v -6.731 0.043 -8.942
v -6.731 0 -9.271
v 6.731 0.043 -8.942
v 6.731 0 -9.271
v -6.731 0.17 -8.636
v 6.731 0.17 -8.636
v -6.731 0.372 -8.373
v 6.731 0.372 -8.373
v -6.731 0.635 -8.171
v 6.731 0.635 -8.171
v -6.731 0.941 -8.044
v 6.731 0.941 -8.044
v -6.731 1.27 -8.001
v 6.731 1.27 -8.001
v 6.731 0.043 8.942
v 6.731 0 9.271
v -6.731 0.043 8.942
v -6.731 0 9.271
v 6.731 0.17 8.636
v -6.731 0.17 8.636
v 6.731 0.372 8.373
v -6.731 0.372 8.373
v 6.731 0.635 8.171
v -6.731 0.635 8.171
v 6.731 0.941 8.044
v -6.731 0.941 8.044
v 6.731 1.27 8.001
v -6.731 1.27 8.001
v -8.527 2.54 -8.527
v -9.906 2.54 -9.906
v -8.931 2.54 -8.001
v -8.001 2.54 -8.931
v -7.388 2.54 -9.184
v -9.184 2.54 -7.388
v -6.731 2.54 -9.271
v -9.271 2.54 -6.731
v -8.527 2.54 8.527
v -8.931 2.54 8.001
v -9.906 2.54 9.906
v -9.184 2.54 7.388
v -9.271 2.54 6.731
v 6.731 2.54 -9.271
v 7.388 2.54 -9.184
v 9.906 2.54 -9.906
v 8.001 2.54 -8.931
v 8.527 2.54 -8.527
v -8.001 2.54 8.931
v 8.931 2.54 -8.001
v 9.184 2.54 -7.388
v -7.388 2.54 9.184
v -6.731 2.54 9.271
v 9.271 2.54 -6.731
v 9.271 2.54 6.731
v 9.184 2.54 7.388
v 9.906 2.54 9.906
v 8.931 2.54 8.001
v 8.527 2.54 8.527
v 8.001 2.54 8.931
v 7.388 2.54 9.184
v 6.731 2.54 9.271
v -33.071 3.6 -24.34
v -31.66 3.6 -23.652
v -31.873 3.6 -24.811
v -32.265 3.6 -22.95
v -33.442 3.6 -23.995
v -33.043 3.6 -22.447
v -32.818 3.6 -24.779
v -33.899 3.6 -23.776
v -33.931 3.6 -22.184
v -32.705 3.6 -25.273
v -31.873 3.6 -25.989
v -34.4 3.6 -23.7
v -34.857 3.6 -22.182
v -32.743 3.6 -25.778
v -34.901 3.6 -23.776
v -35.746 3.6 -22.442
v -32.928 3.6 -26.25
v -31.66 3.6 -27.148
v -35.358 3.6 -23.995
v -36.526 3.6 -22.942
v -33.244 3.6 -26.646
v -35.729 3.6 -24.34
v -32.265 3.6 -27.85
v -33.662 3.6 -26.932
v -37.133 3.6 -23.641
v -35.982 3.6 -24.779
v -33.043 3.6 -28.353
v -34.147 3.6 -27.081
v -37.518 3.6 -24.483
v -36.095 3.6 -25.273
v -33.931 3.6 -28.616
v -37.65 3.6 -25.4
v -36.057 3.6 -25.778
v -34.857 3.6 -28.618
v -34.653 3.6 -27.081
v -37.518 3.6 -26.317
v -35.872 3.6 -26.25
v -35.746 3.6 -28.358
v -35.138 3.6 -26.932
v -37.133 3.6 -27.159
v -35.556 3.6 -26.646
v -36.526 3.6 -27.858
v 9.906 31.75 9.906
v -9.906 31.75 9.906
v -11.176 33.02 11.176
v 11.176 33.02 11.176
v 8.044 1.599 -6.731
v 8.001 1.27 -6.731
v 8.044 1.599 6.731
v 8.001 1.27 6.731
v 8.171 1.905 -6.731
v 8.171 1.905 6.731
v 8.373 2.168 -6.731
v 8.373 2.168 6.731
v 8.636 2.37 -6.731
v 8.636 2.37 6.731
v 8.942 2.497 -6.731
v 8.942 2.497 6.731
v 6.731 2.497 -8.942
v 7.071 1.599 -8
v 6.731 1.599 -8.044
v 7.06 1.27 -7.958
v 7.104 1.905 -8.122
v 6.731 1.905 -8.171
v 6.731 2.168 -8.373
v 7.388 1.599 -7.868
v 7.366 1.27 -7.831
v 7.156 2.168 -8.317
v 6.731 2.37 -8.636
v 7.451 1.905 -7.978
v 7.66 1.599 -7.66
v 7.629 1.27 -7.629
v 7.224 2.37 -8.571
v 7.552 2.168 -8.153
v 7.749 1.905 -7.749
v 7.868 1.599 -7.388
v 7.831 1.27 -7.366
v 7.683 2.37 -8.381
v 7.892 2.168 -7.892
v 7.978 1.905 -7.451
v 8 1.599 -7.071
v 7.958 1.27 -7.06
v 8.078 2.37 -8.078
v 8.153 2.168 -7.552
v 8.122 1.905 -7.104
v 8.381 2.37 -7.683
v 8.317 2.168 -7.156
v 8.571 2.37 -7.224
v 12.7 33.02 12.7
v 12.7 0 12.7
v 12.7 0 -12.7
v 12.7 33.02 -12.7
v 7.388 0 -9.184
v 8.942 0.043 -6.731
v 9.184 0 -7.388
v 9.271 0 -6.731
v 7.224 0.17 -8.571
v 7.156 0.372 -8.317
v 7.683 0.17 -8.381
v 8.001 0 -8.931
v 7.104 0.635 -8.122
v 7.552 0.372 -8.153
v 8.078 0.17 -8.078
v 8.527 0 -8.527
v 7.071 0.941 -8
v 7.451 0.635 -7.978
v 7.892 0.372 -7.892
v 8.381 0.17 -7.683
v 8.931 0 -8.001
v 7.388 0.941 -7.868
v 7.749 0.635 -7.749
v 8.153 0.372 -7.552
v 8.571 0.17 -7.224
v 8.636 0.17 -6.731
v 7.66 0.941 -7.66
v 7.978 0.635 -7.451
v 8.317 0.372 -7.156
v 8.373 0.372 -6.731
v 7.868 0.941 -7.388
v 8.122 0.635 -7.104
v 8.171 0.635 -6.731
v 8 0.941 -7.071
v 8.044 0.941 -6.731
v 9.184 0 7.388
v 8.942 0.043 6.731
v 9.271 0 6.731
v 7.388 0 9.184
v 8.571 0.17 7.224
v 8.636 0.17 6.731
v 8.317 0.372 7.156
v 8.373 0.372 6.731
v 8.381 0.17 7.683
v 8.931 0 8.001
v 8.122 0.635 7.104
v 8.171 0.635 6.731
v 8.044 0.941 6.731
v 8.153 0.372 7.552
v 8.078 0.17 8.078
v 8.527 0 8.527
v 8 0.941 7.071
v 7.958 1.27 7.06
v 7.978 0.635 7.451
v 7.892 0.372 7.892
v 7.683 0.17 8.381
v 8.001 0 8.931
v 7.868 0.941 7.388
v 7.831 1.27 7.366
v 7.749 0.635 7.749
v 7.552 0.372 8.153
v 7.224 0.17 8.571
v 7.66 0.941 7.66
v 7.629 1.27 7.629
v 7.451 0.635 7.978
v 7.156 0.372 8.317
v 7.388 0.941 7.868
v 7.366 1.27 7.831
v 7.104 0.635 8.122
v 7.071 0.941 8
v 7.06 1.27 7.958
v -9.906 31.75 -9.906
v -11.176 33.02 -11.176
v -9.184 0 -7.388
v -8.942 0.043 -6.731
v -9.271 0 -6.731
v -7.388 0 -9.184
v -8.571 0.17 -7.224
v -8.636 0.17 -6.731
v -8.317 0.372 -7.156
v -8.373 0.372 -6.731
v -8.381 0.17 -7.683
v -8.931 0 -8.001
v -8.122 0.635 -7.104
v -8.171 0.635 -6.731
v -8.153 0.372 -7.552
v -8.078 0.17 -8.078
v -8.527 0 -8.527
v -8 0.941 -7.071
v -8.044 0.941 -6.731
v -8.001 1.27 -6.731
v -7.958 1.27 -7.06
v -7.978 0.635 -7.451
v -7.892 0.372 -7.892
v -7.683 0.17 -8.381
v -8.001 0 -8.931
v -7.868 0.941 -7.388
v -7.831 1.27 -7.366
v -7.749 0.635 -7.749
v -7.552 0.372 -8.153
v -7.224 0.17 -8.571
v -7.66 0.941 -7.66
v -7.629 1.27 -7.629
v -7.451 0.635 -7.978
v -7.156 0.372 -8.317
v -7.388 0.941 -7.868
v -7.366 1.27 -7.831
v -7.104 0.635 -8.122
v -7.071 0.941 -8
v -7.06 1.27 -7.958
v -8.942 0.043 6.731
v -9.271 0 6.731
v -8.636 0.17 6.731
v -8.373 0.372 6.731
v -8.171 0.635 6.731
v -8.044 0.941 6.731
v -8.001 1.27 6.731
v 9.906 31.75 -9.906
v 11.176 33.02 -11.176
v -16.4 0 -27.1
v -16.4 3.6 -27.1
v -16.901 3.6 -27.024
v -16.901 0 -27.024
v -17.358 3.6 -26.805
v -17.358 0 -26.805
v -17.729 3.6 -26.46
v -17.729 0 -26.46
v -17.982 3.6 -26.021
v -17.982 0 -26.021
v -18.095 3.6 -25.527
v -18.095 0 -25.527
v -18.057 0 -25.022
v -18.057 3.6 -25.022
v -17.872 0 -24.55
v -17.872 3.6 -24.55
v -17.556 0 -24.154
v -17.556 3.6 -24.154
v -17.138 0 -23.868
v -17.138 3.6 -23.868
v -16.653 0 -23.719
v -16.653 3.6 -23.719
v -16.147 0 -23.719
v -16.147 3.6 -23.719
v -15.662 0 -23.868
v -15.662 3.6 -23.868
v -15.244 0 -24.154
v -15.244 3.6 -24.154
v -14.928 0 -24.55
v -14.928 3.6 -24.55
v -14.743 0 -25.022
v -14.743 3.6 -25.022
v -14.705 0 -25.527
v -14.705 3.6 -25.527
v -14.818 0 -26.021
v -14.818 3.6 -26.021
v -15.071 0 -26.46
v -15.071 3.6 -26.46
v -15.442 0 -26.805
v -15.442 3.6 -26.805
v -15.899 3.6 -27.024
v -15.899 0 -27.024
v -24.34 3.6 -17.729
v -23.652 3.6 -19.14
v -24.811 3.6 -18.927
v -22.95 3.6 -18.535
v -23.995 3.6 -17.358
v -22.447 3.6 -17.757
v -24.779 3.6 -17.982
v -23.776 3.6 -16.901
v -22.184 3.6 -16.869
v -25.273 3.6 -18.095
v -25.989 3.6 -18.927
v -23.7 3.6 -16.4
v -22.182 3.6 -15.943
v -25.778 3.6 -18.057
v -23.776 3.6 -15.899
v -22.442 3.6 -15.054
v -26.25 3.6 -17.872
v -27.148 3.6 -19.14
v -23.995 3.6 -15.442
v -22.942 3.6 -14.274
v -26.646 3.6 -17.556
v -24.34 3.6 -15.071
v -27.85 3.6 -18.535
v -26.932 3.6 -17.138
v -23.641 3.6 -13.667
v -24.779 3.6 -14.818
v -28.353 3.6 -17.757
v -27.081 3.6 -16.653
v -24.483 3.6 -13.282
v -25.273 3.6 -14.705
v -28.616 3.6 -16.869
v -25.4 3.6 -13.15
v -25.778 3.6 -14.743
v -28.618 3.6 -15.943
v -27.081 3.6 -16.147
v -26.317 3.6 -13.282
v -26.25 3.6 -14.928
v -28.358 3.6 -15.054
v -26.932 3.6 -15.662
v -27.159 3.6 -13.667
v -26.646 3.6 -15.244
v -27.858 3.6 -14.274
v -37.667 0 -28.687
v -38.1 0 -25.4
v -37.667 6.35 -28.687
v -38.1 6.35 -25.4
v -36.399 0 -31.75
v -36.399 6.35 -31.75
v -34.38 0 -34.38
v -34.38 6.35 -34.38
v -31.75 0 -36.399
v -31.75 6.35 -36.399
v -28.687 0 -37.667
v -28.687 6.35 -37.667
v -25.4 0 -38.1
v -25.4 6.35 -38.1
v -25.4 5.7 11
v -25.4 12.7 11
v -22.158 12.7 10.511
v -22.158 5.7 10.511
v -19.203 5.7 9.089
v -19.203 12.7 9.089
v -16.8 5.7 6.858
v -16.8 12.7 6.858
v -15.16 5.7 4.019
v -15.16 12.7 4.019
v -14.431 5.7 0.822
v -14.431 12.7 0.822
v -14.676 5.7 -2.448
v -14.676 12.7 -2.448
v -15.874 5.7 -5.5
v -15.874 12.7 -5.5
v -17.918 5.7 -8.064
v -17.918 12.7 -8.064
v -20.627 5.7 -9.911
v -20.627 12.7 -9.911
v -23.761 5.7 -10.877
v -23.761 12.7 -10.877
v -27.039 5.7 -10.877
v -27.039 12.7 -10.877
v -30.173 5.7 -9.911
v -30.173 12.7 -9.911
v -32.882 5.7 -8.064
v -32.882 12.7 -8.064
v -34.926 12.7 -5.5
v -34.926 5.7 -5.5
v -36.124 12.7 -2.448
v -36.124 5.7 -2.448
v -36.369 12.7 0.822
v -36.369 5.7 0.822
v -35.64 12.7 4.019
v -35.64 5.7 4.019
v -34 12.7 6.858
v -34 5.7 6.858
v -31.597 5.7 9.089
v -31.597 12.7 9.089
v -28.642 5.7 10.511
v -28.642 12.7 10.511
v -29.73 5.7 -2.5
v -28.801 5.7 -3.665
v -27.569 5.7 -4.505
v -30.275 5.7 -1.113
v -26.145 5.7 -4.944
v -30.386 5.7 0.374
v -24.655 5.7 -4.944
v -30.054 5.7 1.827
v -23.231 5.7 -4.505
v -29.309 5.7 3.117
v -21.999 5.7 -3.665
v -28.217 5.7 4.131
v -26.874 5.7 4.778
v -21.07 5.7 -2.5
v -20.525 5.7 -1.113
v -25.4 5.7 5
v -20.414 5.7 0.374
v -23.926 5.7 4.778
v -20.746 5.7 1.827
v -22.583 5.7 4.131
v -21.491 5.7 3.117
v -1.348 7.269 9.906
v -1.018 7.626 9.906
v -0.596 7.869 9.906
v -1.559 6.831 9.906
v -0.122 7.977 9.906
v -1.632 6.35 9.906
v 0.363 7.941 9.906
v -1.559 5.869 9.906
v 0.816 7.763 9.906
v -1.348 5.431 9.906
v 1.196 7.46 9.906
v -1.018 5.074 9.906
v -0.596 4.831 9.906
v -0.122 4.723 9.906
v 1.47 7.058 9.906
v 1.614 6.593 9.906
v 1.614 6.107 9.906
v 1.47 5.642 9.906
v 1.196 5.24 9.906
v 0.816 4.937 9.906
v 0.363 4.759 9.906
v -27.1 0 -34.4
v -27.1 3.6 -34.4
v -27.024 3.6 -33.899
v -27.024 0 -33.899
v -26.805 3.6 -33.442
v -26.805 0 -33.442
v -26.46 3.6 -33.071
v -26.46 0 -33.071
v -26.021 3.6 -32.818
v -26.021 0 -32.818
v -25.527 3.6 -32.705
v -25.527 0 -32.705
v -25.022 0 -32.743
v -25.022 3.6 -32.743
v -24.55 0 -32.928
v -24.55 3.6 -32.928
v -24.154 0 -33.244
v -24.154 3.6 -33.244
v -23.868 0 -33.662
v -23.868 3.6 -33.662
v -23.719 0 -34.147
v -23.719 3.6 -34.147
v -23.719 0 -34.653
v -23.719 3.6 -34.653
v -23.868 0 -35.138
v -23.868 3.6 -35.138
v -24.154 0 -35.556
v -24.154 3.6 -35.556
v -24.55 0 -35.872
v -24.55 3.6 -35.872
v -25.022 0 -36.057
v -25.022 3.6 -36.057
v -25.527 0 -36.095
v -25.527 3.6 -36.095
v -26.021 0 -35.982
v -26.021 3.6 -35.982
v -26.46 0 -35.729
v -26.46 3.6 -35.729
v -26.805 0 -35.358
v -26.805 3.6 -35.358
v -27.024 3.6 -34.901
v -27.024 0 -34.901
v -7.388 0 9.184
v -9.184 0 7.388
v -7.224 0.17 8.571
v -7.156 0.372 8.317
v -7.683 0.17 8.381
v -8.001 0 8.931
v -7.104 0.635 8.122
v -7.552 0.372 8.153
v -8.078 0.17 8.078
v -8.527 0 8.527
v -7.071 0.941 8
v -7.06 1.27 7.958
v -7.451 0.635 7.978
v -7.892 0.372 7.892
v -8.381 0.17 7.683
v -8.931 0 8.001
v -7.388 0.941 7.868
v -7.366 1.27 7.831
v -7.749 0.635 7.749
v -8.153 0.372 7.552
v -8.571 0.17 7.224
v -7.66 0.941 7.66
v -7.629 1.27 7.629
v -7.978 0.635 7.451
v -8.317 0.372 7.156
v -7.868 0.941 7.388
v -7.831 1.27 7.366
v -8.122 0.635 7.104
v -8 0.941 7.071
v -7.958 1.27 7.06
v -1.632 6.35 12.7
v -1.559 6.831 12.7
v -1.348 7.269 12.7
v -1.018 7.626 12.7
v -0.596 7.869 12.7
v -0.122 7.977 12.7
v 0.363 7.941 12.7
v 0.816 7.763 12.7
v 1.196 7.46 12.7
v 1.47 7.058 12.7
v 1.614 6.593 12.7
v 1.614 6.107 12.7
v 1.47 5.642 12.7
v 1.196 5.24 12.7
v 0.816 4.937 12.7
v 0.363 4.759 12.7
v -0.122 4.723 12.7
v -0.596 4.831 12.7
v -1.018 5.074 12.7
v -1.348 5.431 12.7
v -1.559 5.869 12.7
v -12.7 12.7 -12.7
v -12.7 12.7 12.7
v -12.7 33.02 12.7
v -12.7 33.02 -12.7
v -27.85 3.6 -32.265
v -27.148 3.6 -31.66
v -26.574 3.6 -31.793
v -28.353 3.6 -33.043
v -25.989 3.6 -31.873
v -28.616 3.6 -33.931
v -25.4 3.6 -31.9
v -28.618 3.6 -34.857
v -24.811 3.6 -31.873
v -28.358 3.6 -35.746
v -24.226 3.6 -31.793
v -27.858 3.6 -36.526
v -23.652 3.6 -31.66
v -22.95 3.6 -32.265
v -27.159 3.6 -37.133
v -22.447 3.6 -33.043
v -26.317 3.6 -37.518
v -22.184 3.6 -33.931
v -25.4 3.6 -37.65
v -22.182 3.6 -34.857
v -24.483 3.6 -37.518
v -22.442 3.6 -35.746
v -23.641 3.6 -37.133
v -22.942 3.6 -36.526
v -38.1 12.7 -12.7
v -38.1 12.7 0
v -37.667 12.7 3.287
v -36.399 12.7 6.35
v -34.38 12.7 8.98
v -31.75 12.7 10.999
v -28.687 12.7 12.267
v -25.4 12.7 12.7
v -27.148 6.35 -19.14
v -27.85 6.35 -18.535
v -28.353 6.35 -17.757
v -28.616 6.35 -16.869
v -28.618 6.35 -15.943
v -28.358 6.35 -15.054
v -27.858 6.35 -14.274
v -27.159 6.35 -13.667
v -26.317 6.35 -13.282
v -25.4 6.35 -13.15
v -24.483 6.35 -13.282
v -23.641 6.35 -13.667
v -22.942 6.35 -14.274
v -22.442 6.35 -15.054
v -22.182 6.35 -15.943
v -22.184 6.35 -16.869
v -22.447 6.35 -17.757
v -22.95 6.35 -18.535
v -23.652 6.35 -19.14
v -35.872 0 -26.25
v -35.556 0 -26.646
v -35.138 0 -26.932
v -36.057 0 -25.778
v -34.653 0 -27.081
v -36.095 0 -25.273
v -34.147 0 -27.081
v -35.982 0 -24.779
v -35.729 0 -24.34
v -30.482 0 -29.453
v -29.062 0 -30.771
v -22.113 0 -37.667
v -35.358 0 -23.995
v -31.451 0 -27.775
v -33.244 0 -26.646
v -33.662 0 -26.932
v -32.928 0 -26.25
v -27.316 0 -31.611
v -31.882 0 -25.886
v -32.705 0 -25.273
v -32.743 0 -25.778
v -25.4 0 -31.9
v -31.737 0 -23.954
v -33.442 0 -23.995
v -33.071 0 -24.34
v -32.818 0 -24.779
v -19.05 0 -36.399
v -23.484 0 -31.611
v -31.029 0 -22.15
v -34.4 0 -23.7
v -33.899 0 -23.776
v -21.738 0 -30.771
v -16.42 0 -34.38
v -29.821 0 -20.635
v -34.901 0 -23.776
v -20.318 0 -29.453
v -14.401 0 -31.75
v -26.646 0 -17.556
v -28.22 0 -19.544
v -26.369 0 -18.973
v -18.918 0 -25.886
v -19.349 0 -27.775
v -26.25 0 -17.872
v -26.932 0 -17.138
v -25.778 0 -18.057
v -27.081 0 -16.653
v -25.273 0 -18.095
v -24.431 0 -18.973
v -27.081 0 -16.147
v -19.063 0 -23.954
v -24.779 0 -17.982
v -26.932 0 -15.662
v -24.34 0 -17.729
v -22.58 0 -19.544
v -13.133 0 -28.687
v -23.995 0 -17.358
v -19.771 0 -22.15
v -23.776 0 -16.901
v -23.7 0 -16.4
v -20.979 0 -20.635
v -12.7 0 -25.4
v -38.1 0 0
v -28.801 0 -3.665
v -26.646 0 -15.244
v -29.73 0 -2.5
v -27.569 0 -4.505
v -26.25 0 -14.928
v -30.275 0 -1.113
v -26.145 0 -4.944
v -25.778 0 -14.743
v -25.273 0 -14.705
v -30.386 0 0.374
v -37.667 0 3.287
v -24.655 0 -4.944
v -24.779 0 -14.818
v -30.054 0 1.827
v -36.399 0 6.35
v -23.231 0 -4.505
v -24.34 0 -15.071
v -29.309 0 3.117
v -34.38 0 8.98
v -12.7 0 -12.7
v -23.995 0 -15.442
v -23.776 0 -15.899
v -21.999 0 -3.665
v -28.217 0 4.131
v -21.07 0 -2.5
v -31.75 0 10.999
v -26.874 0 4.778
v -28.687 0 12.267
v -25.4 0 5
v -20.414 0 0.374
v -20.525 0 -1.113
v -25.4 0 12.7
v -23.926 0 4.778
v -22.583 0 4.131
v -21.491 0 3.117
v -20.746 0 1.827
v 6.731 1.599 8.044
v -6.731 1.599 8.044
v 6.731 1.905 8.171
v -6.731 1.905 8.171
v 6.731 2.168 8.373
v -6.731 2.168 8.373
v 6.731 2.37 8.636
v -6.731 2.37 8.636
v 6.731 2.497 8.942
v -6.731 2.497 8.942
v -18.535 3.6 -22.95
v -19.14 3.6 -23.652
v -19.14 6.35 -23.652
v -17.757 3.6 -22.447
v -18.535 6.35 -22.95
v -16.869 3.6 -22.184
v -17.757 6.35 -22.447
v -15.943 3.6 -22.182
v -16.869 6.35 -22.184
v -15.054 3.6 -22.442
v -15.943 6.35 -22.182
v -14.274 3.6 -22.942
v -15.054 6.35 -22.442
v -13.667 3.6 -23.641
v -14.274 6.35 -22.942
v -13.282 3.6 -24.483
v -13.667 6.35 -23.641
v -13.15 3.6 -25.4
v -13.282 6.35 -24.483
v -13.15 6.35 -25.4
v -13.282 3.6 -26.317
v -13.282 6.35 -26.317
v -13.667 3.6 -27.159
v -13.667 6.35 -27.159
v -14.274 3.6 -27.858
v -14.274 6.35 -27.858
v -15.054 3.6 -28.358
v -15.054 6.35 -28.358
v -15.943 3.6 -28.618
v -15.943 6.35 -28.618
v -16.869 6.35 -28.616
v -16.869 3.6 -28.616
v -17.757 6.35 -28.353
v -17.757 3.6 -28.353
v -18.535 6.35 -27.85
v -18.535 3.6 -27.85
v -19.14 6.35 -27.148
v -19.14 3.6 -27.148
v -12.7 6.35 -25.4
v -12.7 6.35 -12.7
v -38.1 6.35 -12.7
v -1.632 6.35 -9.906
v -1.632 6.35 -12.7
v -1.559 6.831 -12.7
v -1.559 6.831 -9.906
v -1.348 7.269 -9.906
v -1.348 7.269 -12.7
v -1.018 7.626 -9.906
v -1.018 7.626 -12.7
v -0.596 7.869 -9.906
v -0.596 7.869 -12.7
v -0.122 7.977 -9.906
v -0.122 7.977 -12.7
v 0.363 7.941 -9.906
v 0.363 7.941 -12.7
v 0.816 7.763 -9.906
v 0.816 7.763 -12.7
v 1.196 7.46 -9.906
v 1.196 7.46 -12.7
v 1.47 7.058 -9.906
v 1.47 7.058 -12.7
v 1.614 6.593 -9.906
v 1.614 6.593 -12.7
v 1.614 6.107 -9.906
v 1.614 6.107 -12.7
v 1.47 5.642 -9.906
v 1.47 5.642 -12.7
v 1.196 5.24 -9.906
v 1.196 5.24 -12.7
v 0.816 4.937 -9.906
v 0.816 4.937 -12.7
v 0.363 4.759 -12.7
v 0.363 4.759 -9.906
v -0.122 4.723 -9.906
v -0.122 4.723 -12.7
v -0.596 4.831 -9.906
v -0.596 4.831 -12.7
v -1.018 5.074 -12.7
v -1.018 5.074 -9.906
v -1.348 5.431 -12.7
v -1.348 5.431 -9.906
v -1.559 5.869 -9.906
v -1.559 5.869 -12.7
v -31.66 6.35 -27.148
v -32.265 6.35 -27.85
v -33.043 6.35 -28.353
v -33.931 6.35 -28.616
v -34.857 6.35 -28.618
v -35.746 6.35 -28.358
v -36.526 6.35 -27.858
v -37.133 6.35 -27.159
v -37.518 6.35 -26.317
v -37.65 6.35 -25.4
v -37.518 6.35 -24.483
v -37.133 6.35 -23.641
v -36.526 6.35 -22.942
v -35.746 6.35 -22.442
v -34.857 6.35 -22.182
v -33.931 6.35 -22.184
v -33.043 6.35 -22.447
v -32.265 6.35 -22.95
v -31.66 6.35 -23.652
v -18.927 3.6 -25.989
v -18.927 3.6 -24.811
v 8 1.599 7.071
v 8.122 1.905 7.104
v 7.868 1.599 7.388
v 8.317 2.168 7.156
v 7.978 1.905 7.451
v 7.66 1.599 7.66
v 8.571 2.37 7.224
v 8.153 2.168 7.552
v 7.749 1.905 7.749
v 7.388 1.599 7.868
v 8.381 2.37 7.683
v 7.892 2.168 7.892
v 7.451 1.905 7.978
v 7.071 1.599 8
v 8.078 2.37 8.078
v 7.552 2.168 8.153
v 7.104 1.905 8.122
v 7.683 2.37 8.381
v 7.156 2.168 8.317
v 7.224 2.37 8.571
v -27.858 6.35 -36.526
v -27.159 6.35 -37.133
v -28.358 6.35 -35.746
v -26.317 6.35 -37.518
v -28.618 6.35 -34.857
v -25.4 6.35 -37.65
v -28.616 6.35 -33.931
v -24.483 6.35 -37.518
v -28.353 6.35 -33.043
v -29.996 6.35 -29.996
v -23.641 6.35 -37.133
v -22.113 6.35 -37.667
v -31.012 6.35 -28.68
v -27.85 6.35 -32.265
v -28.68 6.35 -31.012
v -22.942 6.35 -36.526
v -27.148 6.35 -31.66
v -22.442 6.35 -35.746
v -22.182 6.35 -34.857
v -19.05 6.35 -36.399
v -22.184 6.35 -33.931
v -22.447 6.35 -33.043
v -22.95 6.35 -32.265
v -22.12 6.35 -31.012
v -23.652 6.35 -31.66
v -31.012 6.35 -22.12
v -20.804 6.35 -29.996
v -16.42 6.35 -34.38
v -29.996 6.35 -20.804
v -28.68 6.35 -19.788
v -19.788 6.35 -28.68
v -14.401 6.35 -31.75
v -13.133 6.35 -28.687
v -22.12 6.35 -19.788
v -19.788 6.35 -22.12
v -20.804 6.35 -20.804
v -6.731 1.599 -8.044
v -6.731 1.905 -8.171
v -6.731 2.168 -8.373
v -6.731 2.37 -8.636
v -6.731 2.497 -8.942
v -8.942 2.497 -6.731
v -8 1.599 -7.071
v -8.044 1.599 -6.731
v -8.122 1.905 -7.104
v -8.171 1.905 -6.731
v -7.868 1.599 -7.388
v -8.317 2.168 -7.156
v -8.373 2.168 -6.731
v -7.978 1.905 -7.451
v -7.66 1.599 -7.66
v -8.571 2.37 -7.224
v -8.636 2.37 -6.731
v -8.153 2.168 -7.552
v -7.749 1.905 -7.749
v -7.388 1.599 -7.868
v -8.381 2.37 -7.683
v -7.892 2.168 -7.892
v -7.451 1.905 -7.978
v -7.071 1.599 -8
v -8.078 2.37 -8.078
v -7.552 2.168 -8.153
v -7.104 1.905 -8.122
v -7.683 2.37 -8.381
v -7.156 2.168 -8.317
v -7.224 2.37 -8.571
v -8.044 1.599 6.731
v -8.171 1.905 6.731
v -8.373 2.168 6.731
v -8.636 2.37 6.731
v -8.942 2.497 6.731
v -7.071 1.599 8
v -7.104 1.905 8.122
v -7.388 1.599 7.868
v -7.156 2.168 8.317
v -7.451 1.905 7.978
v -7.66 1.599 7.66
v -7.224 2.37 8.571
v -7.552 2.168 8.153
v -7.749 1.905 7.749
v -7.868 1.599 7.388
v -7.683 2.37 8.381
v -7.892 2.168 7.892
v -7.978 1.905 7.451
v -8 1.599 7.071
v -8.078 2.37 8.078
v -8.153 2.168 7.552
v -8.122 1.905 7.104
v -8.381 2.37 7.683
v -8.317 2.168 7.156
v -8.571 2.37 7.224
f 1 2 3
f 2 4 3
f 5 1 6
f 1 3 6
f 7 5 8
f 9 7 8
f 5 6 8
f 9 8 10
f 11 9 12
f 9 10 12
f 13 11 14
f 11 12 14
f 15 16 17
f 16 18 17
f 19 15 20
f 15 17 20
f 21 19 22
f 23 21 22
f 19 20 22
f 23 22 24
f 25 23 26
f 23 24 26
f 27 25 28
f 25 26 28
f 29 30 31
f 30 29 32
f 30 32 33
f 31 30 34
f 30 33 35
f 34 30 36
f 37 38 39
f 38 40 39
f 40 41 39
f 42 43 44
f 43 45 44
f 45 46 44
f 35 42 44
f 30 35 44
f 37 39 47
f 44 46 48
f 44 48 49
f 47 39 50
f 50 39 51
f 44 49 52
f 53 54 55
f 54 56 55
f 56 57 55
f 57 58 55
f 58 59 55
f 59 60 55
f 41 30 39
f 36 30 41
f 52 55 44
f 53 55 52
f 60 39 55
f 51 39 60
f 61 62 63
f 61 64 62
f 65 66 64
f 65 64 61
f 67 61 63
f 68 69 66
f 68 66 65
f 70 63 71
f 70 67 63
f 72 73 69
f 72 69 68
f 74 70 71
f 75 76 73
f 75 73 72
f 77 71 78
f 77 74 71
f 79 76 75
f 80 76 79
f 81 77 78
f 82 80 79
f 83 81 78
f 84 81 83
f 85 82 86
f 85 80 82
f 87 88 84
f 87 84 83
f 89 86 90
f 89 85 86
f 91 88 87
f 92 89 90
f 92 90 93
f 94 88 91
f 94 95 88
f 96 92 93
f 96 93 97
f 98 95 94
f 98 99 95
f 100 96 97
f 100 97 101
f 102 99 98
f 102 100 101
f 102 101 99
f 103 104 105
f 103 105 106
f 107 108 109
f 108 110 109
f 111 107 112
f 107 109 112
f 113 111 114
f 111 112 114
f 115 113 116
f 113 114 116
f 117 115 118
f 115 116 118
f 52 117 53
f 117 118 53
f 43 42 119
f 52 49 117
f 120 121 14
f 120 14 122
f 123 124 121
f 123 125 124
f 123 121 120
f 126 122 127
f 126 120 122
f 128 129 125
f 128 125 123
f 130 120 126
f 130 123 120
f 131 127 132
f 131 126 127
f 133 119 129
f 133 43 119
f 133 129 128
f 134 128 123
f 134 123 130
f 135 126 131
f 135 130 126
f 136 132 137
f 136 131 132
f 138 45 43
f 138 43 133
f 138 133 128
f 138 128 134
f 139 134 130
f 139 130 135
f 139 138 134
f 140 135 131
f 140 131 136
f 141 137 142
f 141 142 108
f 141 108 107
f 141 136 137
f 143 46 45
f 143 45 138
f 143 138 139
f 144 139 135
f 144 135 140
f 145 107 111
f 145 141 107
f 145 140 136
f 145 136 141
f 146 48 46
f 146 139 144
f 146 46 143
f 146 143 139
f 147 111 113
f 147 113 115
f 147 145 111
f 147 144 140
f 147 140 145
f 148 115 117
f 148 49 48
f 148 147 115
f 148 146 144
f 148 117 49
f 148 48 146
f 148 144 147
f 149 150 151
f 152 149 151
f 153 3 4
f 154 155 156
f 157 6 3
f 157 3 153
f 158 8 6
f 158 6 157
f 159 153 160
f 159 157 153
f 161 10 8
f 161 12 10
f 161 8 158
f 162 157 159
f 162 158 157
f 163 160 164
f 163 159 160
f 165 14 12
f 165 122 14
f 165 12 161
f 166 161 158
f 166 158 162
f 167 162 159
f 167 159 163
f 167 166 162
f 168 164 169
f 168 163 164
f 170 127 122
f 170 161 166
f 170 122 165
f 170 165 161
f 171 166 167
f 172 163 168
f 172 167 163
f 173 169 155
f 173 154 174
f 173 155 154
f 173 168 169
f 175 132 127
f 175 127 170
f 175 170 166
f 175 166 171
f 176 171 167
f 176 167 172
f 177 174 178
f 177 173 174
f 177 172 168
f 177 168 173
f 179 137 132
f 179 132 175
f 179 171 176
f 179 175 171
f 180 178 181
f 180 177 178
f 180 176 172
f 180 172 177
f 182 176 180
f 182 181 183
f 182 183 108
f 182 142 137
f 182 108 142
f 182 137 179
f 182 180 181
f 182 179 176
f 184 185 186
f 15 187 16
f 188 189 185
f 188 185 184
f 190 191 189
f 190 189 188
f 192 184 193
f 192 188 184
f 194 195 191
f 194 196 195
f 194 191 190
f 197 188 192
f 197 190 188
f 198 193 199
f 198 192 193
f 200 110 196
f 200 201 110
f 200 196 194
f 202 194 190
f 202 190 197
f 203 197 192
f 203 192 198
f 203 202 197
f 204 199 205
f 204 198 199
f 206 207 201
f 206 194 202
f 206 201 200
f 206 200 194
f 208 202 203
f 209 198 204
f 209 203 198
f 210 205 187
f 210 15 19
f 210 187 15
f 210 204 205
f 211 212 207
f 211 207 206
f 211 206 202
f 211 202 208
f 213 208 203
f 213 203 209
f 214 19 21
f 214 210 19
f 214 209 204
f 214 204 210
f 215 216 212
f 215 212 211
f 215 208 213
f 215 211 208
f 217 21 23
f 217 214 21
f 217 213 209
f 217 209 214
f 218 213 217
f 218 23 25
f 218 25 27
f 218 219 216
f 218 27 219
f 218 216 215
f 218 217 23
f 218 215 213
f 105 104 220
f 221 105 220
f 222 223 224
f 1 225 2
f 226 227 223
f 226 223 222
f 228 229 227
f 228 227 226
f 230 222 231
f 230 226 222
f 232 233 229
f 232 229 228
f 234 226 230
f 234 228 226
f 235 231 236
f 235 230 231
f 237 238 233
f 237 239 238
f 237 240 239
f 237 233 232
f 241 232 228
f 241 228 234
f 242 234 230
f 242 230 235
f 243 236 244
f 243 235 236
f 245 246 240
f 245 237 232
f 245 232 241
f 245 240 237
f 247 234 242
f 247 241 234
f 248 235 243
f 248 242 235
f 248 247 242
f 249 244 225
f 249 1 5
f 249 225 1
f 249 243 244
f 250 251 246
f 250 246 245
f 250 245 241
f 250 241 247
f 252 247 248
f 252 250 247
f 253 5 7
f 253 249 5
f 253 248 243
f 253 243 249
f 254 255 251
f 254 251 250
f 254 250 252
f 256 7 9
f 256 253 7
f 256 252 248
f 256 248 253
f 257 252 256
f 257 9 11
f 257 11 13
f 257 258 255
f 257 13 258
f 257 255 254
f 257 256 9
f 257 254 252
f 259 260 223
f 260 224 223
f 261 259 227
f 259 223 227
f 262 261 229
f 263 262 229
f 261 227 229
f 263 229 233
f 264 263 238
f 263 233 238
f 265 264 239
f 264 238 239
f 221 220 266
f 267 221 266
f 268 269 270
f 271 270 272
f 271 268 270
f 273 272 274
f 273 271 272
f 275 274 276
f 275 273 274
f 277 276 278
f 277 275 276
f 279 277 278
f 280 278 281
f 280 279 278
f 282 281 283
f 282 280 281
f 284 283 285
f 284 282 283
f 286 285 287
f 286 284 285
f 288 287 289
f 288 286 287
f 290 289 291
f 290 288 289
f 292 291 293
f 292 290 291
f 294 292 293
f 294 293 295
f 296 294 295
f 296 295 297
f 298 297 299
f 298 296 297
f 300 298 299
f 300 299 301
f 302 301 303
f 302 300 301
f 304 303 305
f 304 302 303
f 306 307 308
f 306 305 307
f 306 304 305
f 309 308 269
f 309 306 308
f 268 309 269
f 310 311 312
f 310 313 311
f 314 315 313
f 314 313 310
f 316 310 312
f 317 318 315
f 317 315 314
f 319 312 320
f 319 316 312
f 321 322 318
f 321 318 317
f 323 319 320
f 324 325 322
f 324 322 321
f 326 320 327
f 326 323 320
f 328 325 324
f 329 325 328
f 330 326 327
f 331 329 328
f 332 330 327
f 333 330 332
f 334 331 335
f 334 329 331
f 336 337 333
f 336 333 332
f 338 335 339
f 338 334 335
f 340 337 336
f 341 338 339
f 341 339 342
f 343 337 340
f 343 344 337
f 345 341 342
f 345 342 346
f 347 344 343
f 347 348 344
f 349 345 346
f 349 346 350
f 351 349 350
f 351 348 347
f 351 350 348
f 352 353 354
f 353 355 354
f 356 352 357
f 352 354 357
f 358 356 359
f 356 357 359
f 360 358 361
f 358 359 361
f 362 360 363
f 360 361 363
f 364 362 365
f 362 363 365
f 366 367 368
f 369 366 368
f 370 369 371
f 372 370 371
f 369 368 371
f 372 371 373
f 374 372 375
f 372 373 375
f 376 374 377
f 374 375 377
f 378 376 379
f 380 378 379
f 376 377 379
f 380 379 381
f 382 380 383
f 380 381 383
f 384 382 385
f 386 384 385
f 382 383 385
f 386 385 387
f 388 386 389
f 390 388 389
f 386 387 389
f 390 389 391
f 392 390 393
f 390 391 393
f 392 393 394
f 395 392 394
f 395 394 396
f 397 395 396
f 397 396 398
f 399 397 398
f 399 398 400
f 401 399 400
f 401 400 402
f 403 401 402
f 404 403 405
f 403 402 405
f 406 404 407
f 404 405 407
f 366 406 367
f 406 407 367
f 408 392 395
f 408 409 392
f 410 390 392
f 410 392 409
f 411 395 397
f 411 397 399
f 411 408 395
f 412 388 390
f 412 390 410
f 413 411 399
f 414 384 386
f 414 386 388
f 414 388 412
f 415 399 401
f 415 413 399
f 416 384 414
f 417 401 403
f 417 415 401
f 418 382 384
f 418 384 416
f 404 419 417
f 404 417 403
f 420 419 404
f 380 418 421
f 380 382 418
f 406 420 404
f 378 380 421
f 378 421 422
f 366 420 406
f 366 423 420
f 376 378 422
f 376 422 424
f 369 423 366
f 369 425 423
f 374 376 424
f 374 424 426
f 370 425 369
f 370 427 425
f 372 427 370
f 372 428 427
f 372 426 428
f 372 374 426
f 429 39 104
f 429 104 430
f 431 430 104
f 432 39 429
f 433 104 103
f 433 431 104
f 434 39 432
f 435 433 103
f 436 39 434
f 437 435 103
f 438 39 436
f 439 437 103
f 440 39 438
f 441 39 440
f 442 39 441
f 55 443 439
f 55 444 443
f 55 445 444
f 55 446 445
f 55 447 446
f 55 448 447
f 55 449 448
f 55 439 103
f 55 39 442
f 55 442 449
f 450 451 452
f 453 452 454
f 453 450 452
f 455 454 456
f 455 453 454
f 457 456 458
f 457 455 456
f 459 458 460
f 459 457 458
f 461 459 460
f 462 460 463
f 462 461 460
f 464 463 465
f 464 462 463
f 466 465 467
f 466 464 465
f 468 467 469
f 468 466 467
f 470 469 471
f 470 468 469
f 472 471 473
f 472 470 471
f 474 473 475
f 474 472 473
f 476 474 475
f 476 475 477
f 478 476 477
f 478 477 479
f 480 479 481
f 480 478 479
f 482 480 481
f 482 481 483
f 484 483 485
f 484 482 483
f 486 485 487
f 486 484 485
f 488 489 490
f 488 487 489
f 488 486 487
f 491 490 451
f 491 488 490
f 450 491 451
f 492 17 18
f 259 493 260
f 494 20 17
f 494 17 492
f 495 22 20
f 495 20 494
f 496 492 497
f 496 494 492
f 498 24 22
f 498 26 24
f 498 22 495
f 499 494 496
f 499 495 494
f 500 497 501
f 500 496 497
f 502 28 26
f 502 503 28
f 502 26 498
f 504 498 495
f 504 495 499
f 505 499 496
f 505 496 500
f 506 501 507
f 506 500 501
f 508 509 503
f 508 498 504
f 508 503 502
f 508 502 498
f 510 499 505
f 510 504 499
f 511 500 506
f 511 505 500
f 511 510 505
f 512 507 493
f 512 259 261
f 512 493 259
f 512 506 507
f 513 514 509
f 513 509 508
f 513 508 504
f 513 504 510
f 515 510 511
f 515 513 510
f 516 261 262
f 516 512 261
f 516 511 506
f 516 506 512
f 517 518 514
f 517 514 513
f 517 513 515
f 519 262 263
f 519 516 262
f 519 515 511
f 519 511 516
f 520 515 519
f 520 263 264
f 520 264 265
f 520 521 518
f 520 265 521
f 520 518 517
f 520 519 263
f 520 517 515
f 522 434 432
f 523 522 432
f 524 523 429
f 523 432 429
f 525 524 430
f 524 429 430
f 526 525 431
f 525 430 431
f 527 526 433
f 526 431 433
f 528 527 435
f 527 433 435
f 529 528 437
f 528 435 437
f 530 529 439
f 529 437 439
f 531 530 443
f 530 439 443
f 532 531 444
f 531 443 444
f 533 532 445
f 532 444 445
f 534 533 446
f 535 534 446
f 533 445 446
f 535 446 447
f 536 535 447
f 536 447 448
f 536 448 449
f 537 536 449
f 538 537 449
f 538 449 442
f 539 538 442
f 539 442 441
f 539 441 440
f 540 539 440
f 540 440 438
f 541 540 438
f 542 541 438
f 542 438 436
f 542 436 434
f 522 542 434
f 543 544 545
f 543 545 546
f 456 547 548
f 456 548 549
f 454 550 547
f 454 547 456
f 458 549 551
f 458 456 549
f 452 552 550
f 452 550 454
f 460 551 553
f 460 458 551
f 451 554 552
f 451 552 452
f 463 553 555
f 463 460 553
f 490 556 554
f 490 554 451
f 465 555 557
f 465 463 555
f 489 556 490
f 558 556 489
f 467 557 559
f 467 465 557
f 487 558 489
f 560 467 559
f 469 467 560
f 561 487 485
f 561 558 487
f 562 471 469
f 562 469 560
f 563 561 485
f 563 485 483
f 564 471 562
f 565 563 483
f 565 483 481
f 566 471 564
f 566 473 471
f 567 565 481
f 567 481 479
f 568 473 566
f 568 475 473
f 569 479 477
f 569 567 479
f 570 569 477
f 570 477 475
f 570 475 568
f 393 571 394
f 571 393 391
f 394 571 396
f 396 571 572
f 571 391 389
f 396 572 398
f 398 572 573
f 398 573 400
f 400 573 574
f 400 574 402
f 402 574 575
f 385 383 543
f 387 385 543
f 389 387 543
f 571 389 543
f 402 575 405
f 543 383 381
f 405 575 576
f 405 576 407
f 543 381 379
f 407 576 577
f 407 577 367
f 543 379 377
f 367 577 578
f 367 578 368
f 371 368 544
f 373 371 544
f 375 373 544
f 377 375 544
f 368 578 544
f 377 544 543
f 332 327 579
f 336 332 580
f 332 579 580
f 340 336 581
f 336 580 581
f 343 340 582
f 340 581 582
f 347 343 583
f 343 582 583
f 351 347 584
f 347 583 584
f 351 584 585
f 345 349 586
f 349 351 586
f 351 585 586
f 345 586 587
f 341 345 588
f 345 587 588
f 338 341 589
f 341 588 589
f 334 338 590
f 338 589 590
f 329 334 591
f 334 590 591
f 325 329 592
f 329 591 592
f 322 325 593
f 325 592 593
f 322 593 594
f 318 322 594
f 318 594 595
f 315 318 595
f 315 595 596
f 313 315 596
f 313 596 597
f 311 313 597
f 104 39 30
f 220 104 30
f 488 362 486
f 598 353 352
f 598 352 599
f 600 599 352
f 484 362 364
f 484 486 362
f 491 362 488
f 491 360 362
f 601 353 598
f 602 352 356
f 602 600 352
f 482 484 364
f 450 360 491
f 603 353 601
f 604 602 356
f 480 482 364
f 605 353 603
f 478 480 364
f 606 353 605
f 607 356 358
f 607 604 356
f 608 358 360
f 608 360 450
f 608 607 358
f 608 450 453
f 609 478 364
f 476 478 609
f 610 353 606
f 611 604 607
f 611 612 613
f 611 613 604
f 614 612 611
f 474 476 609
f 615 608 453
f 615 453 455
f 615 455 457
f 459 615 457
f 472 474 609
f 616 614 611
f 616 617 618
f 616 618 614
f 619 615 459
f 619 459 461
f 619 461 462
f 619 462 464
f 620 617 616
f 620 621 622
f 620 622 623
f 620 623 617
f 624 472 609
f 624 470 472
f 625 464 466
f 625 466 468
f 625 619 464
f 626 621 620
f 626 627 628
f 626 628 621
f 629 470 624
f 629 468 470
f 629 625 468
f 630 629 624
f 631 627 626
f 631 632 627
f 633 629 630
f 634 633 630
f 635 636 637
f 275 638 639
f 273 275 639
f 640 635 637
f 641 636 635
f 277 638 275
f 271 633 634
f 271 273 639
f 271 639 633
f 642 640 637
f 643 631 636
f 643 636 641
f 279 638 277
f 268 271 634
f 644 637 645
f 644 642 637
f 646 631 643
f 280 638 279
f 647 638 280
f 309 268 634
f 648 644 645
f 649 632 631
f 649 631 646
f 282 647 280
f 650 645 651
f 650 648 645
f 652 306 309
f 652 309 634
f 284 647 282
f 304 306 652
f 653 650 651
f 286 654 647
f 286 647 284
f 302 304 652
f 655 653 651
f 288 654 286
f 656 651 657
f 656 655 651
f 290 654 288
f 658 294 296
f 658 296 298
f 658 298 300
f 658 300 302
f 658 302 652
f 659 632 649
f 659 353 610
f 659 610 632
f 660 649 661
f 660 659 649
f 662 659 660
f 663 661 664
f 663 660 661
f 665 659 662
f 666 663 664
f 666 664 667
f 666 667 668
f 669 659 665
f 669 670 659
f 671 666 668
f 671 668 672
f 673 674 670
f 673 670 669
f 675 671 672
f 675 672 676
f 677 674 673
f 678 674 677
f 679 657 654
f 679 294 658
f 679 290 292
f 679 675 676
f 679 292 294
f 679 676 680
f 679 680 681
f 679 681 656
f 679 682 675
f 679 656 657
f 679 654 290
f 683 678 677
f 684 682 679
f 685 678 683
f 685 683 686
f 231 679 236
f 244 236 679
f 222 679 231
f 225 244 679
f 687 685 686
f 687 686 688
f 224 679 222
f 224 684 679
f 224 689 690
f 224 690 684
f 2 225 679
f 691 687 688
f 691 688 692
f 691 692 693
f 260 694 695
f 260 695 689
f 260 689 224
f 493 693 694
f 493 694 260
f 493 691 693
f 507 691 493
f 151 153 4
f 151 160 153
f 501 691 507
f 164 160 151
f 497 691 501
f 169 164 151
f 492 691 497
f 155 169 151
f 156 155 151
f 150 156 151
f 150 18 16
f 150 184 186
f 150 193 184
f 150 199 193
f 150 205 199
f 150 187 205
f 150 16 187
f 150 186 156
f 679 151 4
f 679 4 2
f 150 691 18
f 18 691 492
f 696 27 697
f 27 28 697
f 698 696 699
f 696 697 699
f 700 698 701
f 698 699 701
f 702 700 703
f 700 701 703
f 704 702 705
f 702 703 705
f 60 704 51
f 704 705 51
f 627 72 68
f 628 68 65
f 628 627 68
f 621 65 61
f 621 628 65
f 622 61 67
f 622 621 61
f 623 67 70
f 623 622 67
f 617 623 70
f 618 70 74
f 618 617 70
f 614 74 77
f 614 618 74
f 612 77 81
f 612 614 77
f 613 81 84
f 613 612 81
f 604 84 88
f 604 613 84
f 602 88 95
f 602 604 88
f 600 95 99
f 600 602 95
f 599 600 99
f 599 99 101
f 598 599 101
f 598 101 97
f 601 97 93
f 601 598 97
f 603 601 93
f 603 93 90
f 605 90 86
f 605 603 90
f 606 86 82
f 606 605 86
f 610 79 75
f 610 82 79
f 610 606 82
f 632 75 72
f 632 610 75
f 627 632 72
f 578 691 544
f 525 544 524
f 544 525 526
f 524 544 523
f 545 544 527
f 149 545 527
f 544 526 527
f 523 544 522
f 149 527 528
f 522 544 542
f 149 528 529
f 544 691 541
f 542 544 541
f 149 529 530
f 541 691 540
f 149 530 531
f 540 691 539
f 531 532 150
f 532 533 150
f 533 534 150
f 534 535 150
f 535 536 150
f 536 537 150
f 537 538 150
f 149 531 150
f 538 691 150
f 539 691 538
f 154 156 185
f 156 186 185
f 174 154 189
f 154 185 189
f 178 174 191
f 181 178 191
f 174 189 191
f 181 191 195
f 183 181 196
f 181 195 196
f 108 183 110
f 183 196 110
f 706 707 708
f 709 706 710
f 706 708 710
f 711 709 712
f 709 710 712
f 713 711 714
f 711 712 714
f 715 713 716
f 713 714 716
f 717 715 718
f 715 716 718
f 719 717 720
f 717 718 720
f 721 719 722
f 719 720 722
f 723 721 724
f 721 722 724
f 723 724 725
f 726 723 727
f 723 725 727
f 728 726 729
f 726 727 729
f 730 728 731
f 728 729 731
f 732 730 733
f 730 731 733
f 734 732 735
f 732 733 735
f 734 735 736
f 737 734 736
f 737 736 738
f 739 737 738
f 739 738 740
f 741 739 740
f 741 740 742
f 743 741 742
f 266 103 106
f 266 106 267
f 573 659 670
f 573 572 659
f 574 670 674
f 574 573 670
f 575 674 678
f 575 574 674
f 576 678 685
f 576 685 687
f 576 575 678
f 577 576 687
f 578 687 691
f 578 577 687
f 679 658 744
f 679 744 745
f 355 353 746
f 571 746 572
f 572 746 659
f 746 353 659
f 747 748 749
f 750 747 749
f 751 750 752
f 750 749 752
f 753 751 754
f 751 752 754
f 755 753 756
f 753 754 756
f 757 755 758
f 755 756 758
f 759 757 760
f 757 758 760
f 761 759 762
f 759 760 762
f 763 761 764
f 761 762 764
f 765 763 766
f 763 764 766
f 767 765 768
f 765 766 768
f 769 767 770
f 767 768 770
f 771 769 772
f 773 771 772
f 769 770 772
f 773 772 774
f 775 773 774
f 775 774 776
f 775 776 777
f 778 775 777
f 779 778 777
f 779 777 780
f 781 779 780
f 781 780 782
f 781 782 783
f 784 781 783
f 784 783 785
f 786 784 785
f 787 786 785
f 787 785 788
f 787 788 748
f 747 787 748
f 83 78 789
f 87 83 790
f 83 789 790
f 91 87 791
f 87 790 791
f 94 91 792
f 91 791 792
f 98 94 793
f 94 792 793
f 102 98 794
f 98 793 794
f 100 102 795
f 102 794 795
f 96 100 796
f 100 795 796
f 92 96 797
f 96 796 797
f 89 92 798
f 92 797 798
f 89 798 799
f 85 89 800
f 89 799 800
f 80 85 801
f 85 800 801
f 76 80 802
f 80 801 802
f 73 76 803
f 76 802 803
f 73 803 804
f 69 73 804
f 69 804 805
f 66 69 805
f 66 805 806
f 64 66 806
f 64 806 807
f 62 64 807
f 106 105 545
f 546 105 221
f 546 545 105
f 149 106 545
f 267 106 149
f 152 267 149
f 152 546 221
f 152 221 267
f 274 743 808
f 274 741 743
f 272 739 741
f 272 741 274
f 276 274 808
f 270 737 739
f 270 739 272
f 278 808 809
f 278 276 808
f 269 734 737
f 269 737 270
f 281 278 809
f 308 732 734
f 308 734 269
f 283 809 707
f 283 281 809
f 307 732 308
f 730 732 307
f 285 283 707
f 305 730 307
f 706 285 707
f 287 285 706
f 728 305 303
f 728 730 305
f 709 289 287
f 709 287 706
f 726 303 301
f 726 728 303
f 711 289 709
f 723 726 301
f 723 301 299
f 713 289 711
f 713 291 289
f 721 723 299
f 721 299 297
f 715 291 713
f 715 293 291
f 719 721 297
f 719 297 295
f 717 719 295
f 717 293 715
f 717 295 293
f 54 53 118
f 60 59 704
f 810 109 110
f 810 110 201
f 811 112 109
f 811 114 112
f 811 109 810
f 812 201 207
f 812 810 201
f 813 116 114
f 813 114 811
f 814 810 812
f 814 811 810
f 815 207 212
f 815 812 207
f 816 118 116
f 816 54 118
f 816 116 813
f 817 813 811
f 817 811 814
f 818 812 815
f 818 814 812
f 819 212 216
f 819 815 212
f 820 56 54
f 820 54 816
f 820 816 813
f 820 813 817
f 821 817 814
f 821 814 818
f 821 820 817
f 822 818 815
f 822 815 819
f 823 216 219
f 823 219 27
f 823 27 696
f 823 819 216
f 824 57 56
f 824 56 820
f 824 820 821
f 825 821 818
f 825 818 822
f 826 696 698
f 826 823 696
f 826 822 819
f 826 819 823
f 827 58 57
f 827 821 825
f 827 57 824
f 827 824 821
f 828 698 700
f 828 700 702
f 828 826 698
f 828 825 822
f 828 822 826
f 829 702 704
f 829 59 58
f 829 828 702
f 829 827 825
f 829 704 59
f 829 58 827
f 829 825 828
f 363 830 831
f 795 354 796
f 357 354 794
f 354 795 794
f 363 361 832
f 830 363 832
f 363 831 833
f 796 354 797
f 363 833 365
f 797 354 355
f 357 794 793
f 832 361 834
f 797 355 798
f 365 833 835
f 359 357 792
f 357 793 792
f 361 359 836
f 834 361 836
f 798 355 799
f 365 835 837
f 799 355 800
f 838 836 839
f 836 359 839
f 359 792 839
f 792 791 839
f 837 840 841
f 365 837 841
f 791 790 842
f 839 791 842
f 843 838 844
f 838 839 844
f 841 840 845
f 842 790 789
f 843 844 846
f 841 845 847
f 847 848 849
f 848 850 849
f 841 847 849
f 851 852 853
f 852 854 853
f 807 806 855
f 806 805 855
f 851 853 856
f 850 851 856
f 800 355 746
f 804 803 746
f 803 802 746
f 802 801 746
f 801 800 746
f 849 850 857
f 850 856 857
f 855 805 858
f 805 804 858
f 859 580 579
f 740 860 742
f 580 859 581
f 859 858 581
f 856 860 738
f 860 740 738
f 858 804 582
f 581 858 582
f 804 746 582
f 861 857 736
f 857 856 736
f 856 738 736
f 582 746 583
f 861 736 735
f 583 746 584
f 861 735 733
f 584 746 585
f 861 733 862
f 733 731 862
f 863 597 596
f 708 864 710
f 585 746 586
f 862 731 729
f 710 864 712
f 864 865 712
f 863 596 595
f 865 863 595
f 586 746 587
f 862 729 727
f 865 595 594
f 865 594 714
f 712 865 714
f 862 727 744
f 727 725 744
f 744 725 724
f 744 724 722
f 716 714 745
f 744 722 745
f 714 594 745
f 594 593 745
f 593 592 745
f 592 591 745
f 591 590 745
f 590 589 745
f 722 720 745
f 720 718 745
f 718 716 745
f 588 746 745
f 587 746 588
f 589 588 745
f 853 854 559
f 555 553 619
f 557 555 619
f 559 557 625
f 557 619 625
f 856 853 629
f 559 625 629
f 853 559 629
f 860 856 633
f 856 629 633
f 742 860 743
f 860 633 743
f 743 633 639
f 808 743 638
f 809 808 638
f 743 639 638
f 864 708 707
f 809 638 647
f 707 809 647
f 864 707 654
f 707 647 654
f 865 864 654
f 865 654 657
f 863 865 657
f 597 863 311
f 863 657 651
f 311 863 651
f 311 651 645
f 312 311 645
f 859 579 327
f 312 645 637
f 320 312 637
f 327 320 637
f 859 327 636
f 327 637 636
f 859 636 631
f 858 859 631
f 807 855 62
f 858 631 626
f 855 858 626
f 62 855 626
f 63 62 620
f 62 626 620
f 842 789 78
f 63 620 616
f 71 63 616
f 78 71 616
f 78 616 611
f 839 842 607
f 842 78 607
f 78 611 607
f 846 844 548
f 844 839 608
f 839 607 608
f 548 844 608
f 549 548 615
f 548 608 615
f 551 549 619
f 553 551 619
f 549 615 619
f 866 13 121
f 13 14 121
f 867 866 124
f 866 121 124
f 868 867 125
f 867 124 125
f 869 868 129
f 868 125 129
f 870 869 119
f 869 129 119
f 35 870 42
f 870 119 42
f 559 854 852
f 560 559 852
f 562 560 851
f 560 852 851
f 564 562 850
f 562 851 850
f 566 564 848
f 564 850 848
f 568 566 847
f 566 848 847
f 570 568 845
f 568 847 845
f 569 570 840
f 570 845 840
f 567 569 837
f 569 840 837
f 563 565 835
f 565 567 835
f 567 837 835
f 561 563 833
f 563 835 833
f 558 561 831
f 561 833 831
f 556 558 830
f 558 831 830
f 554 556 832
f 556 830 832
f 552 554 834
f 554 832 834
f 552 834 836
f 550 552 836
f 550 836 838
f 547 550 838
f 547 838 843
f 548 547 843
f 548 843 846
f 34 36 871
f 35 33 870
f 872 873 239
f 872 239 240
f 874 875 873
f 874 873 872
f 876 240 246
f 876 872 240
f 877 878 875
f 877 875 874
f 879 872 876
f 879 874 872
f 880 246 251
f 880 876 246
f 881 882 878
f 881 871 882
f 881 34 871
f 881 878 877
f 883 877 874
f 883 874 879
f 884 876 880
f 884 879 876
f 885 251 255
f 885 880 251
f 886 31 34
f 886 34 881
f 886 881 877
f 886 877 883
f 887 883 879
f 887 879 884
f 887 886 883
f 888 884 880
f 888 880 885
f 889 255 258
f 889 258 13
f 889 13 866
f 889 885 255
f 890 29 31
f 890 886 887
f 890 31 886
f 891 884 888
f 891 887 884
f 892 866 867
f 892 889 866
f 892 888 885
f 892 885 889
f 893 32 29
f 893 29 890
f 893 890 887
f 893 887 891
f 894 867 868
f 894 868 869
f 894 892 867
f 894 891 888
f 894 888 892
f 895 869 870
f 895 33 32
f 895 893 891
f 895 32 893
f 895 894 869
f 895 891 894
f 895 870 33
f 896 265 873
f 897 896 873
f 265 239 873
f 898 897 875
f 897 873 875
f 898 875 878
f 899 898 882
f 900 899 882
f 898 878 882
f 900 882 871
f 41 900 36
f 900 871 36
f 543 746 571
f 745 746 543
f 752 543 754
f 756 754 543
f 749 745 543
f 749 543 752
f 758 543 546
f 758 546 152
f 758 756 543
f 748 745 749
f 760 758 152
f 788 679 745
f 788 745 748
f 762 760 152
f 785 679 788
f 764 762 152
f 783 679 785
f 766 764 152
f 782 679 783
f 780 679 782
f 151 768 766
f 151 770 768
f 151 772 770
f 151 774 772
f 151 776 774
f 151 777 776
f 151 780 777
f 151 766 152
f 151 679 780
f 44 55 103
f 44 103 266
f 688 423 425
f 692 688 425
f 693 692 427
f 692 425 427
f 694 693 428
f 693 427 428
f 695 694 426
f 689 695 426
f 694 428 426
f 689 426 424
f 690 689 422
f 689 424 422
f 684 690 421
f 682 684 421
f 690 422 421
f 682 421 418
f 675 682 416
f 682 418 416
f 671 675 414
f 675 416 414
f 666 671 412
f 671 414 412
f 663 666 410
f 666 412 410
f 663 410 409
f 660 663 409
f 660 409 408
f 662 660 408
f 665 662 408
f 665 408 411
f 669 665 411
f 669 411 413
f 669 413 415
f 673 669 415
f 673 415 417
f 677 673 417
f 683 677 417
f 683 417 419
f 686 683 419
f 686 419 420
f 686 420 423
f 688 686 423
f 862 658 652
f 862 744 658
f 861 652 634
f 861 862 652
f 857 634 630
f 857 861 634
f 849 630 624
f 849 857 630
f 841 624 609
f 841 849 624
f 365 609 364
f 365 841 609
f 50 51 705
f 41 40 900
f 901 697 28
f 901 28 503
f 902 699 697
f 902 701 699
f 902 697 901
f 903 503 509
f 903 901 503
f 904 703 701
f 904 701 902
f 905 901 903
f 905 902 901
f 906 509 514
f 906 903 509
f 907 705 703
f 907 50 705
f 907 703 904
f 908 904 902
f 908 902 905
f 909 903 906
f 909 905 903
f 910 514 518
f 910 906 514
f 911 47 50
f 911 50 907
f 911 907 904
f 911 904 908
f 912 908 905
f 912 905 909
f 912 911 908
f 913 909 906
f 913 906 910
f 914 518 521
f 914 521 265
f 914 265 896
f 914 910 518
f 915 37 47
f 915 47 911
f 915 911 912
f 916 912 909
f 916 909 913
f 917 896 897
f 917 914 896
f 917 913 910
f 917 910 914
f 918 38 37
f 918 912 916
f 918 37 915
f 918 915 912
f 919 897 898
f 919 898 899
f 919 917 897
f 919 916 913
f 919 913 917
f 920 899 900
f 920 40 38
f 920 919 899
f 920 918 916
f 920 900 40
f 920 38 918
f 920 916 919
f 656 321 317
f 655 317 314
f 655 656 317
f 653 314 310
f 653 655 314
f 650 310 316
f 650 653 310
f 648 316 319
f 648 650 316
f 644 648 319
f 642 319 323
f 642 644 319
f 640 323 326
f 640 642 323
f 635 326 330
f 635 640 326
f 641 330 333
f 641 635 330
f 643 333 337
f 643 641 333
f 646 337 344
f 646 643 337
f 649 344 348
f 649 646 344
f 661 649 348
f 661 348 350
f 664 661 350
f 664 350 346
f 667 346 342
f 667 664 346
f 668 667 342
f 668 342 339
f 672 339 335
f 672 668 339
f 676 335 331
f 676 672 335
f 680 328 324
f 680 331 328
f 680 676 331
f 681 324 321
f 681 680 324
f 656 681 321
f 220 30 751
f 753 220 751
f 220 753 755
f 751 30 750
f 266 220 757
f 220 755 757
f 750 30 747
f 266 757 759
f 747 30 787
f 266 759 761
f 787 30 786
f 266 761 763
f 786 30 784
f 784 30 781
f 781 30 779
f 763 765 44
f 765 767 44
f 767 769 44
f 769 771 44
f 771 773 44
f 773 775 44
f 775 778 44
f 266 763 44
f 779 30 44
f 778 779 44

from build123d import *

# Parameters (mm, degrees)
SKETCH1_W             = 25.4
SKETCH1_H             = 25.4
SKETCH1_W_2           = 19.812
SKETCH1_H_2           = 19.812
BOSS_EXTRUDE1_DEPTH   = 33.02
SKETCH9_W             = 25.4
SKETCH9_H             = 25.4
BOSS_EXTRUDE5_DEPTH   = 12.7
SKETCH14_W            = 19.812
SKETCH14_H            = 19.812
SKETCH14_W_2          = 16.002
SKETCH14_H_2          = 16.002
BOSS_EXTRUDE6_DEPTH   = 2.54
SKETCH10_R            = 11
CUT_EXTRUDE1_DEPTH    = 7
CUT_EXTRUDE2_REACH    = 50.572
SKETCH15_R            = 5
SKETCH17_W            = 25.4
SKETCH17_H            = 25.4
BOSS_EXTRUDE7_DEPTH   = 6.35
CUT_EXTRUDE4_REACH    = 65.194
SKETCH18_R            = 6.5
CIRPATTERN1_COUNT     = 4
SKETCH23_R            = 3.2500062
CUT_EXTRUDE5_DEPTH    = 2.75
CIRPATTERN2_COUNT     = 4
FILLET3_R             = 12.7
FILLET4_R             = 1.27
FILLET5_R             = 1.27
F_4_CLEARANCE_HOLE1_D = 3.2639
CHAMFER1_SIZE         = 1.27


with BuildPart() as part:
    # Sketch1 → Boss-Extrude1 (new body)
    with BuildSketch(Plane(origin=(0, 0, 0), x_dir=(1, 0, 0), z_dir=(0, 1, 0))):
        Rectangle(SKETCH1_W, SKETCH1_H)
        Rectangle(SKETCH1_W_2, SKETCH1_H_2, mode=Mode.SUBTRACT)
    extrude(amount=BOSS_EXTRUDE1_DEPTH)

    # Sketch9 → Boss-Extrude5 (add)
    with BuildSketch(Plane.XZ):
        with Locations((-25.4, 0)):
            Rectangle(SKETCH9_W, SKETCH9_H)
    extrude(amount=-BOSS_EXTRUDE5_DEPTH)

    # Sketch14 → Boss-Extrude6 (add)
    with BuildSketch(Plane.XZ):
        Rectangle(SKETCH14_W, SKETCH14_H)
        Rectangle(SKETCH14_W_2, SKETCH14_H_2, mode=Mode.SUBTRACT)
    extrude(amount=-BOSS_EXTRUDE6_DEPTH)

    # Sketch10 → Cut-Extrude1 (cut)
    with BuildSketch(Plane(origin=(0, 12.7, 0), x_dir=(1, 0, 0), z_dir=(0, 1, 0))):
        with Locations(Location((-25.4, 0, 0), (0, 0, 270))):
            Circle(SKETCH10_R)
    extrude(amount=-CUT_EXTRUDE1_DEPTH, mode=Mode.SUBTRACT)

    # Sketch15 → Cut-Extrude2 (cut, up to next)
    with BuildSketch(Plane(origin=(0, 5.7, 0), x_dir=(1, 0, 0), z_dir=(0, 1, 0)), mode=Mode.PRIVATE) as cut_extrude2_sk1:
        with Locations(Location((-25.4, 0, 0), (0, 0, 270))):
            Circle(SKETCH15_R)
    cut_extrude2_tool1 = extrude(cut_extrude2_sk1.sketch, amount=-CUT_EXTRUDE2_REACH, mode=Mode.PRIVATE) & part.part
    add(cut_extrude2_tool1.solids().sort_by_distance((-25.4, 5.7, 0))[0], mode=Mode.SUBTRACT)

    # Sketch17 → Boss-Extrude7 (add)
    with BuildSketch(Plane.XZ):
        with Locations((-25.4, -25.4)):
            Rectangle(SKETCH17_W, SKETCH17_H)
    extrude(amount=-BOSS_EXTRUDE7_DEPTH)

    # Sketch18 → Cut-Extrude4 (cut, up to next)
    with BuildSketch(Plane.XZ, mode=Mode.PRIVATE) as cut_extrude4_sk1:
        with Locations(Location((-25.4, -25.4, 0), (0, 0, 270))):
            Circle(SKETCH18_R)
    cut_extrude4_tool1 = extrude(cut_extrude4_sk1.sketch, amount=-CUT_EXTRUDE4_REACH, mode=Mode.PRIVATE) & part.part
    add(cut_extrude4_tool1.solids().sort_by_distance((-25.4, 0, -25.4))[0], mode=Mode.SUBTRACT)

    # Sketch22 → M3 Clearance Hole1 (revolve, cut)
    with BuildSketch(Plane(origin=(-16.4, 0, -25.4), x_dir=(0, 0, -1), z_dir=(1, 0, 0))):
        Polygon((0, 0), (0, 13.721463052), (1.7, 12.7), (1.7, 0), align=None)
    m3_clearance_hole1 = revolve(axis=Axis((-16.4, -6.35, -25.4), (0, 1, 0)), mode=Mode.SUBTRACT)

    # CirPattern1: M3 Clearance Hole1 ×4 about axis
    cirpattern1_axis = Axis((-25.4, 0, -25.4), (0, 1, 0))
    for i in range(1, CIRPATTERN1_COUNT):
        add(m3_clearance_hole1.rotate(cirpattern1_axis, i * 360 / CIRPATTERN1_COUNT), mode=Mode.SUBTRACT)

    # Sketch23 → Cut-Extrude5 (cut)
    with BuildSketch(Plane(origin=(0, 6.35, 0), x_dir=(1, 0, 0), z_dir=(0, 1, 0))):
        with Locations((-25.4, 34.4)):
            Circle(SKETCH23_R)
    cut_extrude5 = extrude(amount=-CUT_EXTRUDE5_DEPTH, mode=Mode.SUBTRACT)

    # CirPattern2: Cut-Extrude5 ×4 about axis
    cirpattern2_axis = Axis((-25.4, 0, -25.4), (0, 1, 0))
    for i in range(1, CIRPATTERN2_COUNT):
        add(cut_extrude5.rotate(cirpattern2_axis, i * 360 / CIRPATTERN2_COUNT), mode=Mode.SUBTRACT)

    # Fillet3
    fillet3_edges = [part.edges().sort_by_distance(p)[0] for p in [
        (-38.1, 3.175, -38.1),
        (-12.7, 3.175, -38.1),
        (-38.1, 6.35, 12.7),
    ]]
    fillet(fillet3_edges, radius=FILLET3_R - 0.0001)  # a hair under: the kernel refuses the full size

    # Fillet4
    fillet4_edges = [part.edges().sort_by_distance(p)[0] for p in [
        (-8.001, 1.27, 8.001),
        (8.001, 1.27, 8.001),
        (8.001, 1.27, -8.001),
        (-8.001, 1.27, -8.001),
    ]]
    fillet(fillet4_edges, radius=FILLET4_R)

    # Fillet5
    fillet5_edges = [part.edges().sort_by_distance(p)[0] for p in [
        (-7.629025612, 2.54, -7.629025612),
        (-8.001, 2.54, 0),
        (-7.629025612, 2.54, 7.629025612),
        (0, 2.54, 8.001),
        (7.629025612, 2.54, 7.629025612),
        (8.001, 2.54, 0),
        (7.629025612, 2.54, -7.629025612),
        (-7.629025612, 0, -7.629025612),
        (-8.001, 0, 0),
        (-7.629025612, 0, 7.629025612),
        (0, 0, 8.001),
        (7.629025612, 0, 7.629025612),
        (8.001, 0, 0),
        (7.629025612, 0, -7.629025612),
        (0, 2.54, -8.001),
        (0, 0, -8.001),
    ]]
    fillet(fillet5_edges, radius=FILLET5_R - 0.0001)  # a hair under: the kernel refuses the full size

    # #4 Clearance Hole1 (through all)
    with Locations(Plane.XY.offset(12.7)):
        with Locations((0, 6.35)):
            Hole(F_4_CLEARANCE_HOLE1_D / 2)

    # Chamfer1
    chamfer1_edges = [part.edges().sort_by_distance(p)[0] for p in [
        (9.906, 33.02, 0),
        (0, 33.02, -9.906),
        (-9.906, 33.02, 0),
        (0, 33.02, 9.906),
    ]]
    chamfer(chamfer1_edges, length=CHAMFER1_SIZE)


solid = part.part
